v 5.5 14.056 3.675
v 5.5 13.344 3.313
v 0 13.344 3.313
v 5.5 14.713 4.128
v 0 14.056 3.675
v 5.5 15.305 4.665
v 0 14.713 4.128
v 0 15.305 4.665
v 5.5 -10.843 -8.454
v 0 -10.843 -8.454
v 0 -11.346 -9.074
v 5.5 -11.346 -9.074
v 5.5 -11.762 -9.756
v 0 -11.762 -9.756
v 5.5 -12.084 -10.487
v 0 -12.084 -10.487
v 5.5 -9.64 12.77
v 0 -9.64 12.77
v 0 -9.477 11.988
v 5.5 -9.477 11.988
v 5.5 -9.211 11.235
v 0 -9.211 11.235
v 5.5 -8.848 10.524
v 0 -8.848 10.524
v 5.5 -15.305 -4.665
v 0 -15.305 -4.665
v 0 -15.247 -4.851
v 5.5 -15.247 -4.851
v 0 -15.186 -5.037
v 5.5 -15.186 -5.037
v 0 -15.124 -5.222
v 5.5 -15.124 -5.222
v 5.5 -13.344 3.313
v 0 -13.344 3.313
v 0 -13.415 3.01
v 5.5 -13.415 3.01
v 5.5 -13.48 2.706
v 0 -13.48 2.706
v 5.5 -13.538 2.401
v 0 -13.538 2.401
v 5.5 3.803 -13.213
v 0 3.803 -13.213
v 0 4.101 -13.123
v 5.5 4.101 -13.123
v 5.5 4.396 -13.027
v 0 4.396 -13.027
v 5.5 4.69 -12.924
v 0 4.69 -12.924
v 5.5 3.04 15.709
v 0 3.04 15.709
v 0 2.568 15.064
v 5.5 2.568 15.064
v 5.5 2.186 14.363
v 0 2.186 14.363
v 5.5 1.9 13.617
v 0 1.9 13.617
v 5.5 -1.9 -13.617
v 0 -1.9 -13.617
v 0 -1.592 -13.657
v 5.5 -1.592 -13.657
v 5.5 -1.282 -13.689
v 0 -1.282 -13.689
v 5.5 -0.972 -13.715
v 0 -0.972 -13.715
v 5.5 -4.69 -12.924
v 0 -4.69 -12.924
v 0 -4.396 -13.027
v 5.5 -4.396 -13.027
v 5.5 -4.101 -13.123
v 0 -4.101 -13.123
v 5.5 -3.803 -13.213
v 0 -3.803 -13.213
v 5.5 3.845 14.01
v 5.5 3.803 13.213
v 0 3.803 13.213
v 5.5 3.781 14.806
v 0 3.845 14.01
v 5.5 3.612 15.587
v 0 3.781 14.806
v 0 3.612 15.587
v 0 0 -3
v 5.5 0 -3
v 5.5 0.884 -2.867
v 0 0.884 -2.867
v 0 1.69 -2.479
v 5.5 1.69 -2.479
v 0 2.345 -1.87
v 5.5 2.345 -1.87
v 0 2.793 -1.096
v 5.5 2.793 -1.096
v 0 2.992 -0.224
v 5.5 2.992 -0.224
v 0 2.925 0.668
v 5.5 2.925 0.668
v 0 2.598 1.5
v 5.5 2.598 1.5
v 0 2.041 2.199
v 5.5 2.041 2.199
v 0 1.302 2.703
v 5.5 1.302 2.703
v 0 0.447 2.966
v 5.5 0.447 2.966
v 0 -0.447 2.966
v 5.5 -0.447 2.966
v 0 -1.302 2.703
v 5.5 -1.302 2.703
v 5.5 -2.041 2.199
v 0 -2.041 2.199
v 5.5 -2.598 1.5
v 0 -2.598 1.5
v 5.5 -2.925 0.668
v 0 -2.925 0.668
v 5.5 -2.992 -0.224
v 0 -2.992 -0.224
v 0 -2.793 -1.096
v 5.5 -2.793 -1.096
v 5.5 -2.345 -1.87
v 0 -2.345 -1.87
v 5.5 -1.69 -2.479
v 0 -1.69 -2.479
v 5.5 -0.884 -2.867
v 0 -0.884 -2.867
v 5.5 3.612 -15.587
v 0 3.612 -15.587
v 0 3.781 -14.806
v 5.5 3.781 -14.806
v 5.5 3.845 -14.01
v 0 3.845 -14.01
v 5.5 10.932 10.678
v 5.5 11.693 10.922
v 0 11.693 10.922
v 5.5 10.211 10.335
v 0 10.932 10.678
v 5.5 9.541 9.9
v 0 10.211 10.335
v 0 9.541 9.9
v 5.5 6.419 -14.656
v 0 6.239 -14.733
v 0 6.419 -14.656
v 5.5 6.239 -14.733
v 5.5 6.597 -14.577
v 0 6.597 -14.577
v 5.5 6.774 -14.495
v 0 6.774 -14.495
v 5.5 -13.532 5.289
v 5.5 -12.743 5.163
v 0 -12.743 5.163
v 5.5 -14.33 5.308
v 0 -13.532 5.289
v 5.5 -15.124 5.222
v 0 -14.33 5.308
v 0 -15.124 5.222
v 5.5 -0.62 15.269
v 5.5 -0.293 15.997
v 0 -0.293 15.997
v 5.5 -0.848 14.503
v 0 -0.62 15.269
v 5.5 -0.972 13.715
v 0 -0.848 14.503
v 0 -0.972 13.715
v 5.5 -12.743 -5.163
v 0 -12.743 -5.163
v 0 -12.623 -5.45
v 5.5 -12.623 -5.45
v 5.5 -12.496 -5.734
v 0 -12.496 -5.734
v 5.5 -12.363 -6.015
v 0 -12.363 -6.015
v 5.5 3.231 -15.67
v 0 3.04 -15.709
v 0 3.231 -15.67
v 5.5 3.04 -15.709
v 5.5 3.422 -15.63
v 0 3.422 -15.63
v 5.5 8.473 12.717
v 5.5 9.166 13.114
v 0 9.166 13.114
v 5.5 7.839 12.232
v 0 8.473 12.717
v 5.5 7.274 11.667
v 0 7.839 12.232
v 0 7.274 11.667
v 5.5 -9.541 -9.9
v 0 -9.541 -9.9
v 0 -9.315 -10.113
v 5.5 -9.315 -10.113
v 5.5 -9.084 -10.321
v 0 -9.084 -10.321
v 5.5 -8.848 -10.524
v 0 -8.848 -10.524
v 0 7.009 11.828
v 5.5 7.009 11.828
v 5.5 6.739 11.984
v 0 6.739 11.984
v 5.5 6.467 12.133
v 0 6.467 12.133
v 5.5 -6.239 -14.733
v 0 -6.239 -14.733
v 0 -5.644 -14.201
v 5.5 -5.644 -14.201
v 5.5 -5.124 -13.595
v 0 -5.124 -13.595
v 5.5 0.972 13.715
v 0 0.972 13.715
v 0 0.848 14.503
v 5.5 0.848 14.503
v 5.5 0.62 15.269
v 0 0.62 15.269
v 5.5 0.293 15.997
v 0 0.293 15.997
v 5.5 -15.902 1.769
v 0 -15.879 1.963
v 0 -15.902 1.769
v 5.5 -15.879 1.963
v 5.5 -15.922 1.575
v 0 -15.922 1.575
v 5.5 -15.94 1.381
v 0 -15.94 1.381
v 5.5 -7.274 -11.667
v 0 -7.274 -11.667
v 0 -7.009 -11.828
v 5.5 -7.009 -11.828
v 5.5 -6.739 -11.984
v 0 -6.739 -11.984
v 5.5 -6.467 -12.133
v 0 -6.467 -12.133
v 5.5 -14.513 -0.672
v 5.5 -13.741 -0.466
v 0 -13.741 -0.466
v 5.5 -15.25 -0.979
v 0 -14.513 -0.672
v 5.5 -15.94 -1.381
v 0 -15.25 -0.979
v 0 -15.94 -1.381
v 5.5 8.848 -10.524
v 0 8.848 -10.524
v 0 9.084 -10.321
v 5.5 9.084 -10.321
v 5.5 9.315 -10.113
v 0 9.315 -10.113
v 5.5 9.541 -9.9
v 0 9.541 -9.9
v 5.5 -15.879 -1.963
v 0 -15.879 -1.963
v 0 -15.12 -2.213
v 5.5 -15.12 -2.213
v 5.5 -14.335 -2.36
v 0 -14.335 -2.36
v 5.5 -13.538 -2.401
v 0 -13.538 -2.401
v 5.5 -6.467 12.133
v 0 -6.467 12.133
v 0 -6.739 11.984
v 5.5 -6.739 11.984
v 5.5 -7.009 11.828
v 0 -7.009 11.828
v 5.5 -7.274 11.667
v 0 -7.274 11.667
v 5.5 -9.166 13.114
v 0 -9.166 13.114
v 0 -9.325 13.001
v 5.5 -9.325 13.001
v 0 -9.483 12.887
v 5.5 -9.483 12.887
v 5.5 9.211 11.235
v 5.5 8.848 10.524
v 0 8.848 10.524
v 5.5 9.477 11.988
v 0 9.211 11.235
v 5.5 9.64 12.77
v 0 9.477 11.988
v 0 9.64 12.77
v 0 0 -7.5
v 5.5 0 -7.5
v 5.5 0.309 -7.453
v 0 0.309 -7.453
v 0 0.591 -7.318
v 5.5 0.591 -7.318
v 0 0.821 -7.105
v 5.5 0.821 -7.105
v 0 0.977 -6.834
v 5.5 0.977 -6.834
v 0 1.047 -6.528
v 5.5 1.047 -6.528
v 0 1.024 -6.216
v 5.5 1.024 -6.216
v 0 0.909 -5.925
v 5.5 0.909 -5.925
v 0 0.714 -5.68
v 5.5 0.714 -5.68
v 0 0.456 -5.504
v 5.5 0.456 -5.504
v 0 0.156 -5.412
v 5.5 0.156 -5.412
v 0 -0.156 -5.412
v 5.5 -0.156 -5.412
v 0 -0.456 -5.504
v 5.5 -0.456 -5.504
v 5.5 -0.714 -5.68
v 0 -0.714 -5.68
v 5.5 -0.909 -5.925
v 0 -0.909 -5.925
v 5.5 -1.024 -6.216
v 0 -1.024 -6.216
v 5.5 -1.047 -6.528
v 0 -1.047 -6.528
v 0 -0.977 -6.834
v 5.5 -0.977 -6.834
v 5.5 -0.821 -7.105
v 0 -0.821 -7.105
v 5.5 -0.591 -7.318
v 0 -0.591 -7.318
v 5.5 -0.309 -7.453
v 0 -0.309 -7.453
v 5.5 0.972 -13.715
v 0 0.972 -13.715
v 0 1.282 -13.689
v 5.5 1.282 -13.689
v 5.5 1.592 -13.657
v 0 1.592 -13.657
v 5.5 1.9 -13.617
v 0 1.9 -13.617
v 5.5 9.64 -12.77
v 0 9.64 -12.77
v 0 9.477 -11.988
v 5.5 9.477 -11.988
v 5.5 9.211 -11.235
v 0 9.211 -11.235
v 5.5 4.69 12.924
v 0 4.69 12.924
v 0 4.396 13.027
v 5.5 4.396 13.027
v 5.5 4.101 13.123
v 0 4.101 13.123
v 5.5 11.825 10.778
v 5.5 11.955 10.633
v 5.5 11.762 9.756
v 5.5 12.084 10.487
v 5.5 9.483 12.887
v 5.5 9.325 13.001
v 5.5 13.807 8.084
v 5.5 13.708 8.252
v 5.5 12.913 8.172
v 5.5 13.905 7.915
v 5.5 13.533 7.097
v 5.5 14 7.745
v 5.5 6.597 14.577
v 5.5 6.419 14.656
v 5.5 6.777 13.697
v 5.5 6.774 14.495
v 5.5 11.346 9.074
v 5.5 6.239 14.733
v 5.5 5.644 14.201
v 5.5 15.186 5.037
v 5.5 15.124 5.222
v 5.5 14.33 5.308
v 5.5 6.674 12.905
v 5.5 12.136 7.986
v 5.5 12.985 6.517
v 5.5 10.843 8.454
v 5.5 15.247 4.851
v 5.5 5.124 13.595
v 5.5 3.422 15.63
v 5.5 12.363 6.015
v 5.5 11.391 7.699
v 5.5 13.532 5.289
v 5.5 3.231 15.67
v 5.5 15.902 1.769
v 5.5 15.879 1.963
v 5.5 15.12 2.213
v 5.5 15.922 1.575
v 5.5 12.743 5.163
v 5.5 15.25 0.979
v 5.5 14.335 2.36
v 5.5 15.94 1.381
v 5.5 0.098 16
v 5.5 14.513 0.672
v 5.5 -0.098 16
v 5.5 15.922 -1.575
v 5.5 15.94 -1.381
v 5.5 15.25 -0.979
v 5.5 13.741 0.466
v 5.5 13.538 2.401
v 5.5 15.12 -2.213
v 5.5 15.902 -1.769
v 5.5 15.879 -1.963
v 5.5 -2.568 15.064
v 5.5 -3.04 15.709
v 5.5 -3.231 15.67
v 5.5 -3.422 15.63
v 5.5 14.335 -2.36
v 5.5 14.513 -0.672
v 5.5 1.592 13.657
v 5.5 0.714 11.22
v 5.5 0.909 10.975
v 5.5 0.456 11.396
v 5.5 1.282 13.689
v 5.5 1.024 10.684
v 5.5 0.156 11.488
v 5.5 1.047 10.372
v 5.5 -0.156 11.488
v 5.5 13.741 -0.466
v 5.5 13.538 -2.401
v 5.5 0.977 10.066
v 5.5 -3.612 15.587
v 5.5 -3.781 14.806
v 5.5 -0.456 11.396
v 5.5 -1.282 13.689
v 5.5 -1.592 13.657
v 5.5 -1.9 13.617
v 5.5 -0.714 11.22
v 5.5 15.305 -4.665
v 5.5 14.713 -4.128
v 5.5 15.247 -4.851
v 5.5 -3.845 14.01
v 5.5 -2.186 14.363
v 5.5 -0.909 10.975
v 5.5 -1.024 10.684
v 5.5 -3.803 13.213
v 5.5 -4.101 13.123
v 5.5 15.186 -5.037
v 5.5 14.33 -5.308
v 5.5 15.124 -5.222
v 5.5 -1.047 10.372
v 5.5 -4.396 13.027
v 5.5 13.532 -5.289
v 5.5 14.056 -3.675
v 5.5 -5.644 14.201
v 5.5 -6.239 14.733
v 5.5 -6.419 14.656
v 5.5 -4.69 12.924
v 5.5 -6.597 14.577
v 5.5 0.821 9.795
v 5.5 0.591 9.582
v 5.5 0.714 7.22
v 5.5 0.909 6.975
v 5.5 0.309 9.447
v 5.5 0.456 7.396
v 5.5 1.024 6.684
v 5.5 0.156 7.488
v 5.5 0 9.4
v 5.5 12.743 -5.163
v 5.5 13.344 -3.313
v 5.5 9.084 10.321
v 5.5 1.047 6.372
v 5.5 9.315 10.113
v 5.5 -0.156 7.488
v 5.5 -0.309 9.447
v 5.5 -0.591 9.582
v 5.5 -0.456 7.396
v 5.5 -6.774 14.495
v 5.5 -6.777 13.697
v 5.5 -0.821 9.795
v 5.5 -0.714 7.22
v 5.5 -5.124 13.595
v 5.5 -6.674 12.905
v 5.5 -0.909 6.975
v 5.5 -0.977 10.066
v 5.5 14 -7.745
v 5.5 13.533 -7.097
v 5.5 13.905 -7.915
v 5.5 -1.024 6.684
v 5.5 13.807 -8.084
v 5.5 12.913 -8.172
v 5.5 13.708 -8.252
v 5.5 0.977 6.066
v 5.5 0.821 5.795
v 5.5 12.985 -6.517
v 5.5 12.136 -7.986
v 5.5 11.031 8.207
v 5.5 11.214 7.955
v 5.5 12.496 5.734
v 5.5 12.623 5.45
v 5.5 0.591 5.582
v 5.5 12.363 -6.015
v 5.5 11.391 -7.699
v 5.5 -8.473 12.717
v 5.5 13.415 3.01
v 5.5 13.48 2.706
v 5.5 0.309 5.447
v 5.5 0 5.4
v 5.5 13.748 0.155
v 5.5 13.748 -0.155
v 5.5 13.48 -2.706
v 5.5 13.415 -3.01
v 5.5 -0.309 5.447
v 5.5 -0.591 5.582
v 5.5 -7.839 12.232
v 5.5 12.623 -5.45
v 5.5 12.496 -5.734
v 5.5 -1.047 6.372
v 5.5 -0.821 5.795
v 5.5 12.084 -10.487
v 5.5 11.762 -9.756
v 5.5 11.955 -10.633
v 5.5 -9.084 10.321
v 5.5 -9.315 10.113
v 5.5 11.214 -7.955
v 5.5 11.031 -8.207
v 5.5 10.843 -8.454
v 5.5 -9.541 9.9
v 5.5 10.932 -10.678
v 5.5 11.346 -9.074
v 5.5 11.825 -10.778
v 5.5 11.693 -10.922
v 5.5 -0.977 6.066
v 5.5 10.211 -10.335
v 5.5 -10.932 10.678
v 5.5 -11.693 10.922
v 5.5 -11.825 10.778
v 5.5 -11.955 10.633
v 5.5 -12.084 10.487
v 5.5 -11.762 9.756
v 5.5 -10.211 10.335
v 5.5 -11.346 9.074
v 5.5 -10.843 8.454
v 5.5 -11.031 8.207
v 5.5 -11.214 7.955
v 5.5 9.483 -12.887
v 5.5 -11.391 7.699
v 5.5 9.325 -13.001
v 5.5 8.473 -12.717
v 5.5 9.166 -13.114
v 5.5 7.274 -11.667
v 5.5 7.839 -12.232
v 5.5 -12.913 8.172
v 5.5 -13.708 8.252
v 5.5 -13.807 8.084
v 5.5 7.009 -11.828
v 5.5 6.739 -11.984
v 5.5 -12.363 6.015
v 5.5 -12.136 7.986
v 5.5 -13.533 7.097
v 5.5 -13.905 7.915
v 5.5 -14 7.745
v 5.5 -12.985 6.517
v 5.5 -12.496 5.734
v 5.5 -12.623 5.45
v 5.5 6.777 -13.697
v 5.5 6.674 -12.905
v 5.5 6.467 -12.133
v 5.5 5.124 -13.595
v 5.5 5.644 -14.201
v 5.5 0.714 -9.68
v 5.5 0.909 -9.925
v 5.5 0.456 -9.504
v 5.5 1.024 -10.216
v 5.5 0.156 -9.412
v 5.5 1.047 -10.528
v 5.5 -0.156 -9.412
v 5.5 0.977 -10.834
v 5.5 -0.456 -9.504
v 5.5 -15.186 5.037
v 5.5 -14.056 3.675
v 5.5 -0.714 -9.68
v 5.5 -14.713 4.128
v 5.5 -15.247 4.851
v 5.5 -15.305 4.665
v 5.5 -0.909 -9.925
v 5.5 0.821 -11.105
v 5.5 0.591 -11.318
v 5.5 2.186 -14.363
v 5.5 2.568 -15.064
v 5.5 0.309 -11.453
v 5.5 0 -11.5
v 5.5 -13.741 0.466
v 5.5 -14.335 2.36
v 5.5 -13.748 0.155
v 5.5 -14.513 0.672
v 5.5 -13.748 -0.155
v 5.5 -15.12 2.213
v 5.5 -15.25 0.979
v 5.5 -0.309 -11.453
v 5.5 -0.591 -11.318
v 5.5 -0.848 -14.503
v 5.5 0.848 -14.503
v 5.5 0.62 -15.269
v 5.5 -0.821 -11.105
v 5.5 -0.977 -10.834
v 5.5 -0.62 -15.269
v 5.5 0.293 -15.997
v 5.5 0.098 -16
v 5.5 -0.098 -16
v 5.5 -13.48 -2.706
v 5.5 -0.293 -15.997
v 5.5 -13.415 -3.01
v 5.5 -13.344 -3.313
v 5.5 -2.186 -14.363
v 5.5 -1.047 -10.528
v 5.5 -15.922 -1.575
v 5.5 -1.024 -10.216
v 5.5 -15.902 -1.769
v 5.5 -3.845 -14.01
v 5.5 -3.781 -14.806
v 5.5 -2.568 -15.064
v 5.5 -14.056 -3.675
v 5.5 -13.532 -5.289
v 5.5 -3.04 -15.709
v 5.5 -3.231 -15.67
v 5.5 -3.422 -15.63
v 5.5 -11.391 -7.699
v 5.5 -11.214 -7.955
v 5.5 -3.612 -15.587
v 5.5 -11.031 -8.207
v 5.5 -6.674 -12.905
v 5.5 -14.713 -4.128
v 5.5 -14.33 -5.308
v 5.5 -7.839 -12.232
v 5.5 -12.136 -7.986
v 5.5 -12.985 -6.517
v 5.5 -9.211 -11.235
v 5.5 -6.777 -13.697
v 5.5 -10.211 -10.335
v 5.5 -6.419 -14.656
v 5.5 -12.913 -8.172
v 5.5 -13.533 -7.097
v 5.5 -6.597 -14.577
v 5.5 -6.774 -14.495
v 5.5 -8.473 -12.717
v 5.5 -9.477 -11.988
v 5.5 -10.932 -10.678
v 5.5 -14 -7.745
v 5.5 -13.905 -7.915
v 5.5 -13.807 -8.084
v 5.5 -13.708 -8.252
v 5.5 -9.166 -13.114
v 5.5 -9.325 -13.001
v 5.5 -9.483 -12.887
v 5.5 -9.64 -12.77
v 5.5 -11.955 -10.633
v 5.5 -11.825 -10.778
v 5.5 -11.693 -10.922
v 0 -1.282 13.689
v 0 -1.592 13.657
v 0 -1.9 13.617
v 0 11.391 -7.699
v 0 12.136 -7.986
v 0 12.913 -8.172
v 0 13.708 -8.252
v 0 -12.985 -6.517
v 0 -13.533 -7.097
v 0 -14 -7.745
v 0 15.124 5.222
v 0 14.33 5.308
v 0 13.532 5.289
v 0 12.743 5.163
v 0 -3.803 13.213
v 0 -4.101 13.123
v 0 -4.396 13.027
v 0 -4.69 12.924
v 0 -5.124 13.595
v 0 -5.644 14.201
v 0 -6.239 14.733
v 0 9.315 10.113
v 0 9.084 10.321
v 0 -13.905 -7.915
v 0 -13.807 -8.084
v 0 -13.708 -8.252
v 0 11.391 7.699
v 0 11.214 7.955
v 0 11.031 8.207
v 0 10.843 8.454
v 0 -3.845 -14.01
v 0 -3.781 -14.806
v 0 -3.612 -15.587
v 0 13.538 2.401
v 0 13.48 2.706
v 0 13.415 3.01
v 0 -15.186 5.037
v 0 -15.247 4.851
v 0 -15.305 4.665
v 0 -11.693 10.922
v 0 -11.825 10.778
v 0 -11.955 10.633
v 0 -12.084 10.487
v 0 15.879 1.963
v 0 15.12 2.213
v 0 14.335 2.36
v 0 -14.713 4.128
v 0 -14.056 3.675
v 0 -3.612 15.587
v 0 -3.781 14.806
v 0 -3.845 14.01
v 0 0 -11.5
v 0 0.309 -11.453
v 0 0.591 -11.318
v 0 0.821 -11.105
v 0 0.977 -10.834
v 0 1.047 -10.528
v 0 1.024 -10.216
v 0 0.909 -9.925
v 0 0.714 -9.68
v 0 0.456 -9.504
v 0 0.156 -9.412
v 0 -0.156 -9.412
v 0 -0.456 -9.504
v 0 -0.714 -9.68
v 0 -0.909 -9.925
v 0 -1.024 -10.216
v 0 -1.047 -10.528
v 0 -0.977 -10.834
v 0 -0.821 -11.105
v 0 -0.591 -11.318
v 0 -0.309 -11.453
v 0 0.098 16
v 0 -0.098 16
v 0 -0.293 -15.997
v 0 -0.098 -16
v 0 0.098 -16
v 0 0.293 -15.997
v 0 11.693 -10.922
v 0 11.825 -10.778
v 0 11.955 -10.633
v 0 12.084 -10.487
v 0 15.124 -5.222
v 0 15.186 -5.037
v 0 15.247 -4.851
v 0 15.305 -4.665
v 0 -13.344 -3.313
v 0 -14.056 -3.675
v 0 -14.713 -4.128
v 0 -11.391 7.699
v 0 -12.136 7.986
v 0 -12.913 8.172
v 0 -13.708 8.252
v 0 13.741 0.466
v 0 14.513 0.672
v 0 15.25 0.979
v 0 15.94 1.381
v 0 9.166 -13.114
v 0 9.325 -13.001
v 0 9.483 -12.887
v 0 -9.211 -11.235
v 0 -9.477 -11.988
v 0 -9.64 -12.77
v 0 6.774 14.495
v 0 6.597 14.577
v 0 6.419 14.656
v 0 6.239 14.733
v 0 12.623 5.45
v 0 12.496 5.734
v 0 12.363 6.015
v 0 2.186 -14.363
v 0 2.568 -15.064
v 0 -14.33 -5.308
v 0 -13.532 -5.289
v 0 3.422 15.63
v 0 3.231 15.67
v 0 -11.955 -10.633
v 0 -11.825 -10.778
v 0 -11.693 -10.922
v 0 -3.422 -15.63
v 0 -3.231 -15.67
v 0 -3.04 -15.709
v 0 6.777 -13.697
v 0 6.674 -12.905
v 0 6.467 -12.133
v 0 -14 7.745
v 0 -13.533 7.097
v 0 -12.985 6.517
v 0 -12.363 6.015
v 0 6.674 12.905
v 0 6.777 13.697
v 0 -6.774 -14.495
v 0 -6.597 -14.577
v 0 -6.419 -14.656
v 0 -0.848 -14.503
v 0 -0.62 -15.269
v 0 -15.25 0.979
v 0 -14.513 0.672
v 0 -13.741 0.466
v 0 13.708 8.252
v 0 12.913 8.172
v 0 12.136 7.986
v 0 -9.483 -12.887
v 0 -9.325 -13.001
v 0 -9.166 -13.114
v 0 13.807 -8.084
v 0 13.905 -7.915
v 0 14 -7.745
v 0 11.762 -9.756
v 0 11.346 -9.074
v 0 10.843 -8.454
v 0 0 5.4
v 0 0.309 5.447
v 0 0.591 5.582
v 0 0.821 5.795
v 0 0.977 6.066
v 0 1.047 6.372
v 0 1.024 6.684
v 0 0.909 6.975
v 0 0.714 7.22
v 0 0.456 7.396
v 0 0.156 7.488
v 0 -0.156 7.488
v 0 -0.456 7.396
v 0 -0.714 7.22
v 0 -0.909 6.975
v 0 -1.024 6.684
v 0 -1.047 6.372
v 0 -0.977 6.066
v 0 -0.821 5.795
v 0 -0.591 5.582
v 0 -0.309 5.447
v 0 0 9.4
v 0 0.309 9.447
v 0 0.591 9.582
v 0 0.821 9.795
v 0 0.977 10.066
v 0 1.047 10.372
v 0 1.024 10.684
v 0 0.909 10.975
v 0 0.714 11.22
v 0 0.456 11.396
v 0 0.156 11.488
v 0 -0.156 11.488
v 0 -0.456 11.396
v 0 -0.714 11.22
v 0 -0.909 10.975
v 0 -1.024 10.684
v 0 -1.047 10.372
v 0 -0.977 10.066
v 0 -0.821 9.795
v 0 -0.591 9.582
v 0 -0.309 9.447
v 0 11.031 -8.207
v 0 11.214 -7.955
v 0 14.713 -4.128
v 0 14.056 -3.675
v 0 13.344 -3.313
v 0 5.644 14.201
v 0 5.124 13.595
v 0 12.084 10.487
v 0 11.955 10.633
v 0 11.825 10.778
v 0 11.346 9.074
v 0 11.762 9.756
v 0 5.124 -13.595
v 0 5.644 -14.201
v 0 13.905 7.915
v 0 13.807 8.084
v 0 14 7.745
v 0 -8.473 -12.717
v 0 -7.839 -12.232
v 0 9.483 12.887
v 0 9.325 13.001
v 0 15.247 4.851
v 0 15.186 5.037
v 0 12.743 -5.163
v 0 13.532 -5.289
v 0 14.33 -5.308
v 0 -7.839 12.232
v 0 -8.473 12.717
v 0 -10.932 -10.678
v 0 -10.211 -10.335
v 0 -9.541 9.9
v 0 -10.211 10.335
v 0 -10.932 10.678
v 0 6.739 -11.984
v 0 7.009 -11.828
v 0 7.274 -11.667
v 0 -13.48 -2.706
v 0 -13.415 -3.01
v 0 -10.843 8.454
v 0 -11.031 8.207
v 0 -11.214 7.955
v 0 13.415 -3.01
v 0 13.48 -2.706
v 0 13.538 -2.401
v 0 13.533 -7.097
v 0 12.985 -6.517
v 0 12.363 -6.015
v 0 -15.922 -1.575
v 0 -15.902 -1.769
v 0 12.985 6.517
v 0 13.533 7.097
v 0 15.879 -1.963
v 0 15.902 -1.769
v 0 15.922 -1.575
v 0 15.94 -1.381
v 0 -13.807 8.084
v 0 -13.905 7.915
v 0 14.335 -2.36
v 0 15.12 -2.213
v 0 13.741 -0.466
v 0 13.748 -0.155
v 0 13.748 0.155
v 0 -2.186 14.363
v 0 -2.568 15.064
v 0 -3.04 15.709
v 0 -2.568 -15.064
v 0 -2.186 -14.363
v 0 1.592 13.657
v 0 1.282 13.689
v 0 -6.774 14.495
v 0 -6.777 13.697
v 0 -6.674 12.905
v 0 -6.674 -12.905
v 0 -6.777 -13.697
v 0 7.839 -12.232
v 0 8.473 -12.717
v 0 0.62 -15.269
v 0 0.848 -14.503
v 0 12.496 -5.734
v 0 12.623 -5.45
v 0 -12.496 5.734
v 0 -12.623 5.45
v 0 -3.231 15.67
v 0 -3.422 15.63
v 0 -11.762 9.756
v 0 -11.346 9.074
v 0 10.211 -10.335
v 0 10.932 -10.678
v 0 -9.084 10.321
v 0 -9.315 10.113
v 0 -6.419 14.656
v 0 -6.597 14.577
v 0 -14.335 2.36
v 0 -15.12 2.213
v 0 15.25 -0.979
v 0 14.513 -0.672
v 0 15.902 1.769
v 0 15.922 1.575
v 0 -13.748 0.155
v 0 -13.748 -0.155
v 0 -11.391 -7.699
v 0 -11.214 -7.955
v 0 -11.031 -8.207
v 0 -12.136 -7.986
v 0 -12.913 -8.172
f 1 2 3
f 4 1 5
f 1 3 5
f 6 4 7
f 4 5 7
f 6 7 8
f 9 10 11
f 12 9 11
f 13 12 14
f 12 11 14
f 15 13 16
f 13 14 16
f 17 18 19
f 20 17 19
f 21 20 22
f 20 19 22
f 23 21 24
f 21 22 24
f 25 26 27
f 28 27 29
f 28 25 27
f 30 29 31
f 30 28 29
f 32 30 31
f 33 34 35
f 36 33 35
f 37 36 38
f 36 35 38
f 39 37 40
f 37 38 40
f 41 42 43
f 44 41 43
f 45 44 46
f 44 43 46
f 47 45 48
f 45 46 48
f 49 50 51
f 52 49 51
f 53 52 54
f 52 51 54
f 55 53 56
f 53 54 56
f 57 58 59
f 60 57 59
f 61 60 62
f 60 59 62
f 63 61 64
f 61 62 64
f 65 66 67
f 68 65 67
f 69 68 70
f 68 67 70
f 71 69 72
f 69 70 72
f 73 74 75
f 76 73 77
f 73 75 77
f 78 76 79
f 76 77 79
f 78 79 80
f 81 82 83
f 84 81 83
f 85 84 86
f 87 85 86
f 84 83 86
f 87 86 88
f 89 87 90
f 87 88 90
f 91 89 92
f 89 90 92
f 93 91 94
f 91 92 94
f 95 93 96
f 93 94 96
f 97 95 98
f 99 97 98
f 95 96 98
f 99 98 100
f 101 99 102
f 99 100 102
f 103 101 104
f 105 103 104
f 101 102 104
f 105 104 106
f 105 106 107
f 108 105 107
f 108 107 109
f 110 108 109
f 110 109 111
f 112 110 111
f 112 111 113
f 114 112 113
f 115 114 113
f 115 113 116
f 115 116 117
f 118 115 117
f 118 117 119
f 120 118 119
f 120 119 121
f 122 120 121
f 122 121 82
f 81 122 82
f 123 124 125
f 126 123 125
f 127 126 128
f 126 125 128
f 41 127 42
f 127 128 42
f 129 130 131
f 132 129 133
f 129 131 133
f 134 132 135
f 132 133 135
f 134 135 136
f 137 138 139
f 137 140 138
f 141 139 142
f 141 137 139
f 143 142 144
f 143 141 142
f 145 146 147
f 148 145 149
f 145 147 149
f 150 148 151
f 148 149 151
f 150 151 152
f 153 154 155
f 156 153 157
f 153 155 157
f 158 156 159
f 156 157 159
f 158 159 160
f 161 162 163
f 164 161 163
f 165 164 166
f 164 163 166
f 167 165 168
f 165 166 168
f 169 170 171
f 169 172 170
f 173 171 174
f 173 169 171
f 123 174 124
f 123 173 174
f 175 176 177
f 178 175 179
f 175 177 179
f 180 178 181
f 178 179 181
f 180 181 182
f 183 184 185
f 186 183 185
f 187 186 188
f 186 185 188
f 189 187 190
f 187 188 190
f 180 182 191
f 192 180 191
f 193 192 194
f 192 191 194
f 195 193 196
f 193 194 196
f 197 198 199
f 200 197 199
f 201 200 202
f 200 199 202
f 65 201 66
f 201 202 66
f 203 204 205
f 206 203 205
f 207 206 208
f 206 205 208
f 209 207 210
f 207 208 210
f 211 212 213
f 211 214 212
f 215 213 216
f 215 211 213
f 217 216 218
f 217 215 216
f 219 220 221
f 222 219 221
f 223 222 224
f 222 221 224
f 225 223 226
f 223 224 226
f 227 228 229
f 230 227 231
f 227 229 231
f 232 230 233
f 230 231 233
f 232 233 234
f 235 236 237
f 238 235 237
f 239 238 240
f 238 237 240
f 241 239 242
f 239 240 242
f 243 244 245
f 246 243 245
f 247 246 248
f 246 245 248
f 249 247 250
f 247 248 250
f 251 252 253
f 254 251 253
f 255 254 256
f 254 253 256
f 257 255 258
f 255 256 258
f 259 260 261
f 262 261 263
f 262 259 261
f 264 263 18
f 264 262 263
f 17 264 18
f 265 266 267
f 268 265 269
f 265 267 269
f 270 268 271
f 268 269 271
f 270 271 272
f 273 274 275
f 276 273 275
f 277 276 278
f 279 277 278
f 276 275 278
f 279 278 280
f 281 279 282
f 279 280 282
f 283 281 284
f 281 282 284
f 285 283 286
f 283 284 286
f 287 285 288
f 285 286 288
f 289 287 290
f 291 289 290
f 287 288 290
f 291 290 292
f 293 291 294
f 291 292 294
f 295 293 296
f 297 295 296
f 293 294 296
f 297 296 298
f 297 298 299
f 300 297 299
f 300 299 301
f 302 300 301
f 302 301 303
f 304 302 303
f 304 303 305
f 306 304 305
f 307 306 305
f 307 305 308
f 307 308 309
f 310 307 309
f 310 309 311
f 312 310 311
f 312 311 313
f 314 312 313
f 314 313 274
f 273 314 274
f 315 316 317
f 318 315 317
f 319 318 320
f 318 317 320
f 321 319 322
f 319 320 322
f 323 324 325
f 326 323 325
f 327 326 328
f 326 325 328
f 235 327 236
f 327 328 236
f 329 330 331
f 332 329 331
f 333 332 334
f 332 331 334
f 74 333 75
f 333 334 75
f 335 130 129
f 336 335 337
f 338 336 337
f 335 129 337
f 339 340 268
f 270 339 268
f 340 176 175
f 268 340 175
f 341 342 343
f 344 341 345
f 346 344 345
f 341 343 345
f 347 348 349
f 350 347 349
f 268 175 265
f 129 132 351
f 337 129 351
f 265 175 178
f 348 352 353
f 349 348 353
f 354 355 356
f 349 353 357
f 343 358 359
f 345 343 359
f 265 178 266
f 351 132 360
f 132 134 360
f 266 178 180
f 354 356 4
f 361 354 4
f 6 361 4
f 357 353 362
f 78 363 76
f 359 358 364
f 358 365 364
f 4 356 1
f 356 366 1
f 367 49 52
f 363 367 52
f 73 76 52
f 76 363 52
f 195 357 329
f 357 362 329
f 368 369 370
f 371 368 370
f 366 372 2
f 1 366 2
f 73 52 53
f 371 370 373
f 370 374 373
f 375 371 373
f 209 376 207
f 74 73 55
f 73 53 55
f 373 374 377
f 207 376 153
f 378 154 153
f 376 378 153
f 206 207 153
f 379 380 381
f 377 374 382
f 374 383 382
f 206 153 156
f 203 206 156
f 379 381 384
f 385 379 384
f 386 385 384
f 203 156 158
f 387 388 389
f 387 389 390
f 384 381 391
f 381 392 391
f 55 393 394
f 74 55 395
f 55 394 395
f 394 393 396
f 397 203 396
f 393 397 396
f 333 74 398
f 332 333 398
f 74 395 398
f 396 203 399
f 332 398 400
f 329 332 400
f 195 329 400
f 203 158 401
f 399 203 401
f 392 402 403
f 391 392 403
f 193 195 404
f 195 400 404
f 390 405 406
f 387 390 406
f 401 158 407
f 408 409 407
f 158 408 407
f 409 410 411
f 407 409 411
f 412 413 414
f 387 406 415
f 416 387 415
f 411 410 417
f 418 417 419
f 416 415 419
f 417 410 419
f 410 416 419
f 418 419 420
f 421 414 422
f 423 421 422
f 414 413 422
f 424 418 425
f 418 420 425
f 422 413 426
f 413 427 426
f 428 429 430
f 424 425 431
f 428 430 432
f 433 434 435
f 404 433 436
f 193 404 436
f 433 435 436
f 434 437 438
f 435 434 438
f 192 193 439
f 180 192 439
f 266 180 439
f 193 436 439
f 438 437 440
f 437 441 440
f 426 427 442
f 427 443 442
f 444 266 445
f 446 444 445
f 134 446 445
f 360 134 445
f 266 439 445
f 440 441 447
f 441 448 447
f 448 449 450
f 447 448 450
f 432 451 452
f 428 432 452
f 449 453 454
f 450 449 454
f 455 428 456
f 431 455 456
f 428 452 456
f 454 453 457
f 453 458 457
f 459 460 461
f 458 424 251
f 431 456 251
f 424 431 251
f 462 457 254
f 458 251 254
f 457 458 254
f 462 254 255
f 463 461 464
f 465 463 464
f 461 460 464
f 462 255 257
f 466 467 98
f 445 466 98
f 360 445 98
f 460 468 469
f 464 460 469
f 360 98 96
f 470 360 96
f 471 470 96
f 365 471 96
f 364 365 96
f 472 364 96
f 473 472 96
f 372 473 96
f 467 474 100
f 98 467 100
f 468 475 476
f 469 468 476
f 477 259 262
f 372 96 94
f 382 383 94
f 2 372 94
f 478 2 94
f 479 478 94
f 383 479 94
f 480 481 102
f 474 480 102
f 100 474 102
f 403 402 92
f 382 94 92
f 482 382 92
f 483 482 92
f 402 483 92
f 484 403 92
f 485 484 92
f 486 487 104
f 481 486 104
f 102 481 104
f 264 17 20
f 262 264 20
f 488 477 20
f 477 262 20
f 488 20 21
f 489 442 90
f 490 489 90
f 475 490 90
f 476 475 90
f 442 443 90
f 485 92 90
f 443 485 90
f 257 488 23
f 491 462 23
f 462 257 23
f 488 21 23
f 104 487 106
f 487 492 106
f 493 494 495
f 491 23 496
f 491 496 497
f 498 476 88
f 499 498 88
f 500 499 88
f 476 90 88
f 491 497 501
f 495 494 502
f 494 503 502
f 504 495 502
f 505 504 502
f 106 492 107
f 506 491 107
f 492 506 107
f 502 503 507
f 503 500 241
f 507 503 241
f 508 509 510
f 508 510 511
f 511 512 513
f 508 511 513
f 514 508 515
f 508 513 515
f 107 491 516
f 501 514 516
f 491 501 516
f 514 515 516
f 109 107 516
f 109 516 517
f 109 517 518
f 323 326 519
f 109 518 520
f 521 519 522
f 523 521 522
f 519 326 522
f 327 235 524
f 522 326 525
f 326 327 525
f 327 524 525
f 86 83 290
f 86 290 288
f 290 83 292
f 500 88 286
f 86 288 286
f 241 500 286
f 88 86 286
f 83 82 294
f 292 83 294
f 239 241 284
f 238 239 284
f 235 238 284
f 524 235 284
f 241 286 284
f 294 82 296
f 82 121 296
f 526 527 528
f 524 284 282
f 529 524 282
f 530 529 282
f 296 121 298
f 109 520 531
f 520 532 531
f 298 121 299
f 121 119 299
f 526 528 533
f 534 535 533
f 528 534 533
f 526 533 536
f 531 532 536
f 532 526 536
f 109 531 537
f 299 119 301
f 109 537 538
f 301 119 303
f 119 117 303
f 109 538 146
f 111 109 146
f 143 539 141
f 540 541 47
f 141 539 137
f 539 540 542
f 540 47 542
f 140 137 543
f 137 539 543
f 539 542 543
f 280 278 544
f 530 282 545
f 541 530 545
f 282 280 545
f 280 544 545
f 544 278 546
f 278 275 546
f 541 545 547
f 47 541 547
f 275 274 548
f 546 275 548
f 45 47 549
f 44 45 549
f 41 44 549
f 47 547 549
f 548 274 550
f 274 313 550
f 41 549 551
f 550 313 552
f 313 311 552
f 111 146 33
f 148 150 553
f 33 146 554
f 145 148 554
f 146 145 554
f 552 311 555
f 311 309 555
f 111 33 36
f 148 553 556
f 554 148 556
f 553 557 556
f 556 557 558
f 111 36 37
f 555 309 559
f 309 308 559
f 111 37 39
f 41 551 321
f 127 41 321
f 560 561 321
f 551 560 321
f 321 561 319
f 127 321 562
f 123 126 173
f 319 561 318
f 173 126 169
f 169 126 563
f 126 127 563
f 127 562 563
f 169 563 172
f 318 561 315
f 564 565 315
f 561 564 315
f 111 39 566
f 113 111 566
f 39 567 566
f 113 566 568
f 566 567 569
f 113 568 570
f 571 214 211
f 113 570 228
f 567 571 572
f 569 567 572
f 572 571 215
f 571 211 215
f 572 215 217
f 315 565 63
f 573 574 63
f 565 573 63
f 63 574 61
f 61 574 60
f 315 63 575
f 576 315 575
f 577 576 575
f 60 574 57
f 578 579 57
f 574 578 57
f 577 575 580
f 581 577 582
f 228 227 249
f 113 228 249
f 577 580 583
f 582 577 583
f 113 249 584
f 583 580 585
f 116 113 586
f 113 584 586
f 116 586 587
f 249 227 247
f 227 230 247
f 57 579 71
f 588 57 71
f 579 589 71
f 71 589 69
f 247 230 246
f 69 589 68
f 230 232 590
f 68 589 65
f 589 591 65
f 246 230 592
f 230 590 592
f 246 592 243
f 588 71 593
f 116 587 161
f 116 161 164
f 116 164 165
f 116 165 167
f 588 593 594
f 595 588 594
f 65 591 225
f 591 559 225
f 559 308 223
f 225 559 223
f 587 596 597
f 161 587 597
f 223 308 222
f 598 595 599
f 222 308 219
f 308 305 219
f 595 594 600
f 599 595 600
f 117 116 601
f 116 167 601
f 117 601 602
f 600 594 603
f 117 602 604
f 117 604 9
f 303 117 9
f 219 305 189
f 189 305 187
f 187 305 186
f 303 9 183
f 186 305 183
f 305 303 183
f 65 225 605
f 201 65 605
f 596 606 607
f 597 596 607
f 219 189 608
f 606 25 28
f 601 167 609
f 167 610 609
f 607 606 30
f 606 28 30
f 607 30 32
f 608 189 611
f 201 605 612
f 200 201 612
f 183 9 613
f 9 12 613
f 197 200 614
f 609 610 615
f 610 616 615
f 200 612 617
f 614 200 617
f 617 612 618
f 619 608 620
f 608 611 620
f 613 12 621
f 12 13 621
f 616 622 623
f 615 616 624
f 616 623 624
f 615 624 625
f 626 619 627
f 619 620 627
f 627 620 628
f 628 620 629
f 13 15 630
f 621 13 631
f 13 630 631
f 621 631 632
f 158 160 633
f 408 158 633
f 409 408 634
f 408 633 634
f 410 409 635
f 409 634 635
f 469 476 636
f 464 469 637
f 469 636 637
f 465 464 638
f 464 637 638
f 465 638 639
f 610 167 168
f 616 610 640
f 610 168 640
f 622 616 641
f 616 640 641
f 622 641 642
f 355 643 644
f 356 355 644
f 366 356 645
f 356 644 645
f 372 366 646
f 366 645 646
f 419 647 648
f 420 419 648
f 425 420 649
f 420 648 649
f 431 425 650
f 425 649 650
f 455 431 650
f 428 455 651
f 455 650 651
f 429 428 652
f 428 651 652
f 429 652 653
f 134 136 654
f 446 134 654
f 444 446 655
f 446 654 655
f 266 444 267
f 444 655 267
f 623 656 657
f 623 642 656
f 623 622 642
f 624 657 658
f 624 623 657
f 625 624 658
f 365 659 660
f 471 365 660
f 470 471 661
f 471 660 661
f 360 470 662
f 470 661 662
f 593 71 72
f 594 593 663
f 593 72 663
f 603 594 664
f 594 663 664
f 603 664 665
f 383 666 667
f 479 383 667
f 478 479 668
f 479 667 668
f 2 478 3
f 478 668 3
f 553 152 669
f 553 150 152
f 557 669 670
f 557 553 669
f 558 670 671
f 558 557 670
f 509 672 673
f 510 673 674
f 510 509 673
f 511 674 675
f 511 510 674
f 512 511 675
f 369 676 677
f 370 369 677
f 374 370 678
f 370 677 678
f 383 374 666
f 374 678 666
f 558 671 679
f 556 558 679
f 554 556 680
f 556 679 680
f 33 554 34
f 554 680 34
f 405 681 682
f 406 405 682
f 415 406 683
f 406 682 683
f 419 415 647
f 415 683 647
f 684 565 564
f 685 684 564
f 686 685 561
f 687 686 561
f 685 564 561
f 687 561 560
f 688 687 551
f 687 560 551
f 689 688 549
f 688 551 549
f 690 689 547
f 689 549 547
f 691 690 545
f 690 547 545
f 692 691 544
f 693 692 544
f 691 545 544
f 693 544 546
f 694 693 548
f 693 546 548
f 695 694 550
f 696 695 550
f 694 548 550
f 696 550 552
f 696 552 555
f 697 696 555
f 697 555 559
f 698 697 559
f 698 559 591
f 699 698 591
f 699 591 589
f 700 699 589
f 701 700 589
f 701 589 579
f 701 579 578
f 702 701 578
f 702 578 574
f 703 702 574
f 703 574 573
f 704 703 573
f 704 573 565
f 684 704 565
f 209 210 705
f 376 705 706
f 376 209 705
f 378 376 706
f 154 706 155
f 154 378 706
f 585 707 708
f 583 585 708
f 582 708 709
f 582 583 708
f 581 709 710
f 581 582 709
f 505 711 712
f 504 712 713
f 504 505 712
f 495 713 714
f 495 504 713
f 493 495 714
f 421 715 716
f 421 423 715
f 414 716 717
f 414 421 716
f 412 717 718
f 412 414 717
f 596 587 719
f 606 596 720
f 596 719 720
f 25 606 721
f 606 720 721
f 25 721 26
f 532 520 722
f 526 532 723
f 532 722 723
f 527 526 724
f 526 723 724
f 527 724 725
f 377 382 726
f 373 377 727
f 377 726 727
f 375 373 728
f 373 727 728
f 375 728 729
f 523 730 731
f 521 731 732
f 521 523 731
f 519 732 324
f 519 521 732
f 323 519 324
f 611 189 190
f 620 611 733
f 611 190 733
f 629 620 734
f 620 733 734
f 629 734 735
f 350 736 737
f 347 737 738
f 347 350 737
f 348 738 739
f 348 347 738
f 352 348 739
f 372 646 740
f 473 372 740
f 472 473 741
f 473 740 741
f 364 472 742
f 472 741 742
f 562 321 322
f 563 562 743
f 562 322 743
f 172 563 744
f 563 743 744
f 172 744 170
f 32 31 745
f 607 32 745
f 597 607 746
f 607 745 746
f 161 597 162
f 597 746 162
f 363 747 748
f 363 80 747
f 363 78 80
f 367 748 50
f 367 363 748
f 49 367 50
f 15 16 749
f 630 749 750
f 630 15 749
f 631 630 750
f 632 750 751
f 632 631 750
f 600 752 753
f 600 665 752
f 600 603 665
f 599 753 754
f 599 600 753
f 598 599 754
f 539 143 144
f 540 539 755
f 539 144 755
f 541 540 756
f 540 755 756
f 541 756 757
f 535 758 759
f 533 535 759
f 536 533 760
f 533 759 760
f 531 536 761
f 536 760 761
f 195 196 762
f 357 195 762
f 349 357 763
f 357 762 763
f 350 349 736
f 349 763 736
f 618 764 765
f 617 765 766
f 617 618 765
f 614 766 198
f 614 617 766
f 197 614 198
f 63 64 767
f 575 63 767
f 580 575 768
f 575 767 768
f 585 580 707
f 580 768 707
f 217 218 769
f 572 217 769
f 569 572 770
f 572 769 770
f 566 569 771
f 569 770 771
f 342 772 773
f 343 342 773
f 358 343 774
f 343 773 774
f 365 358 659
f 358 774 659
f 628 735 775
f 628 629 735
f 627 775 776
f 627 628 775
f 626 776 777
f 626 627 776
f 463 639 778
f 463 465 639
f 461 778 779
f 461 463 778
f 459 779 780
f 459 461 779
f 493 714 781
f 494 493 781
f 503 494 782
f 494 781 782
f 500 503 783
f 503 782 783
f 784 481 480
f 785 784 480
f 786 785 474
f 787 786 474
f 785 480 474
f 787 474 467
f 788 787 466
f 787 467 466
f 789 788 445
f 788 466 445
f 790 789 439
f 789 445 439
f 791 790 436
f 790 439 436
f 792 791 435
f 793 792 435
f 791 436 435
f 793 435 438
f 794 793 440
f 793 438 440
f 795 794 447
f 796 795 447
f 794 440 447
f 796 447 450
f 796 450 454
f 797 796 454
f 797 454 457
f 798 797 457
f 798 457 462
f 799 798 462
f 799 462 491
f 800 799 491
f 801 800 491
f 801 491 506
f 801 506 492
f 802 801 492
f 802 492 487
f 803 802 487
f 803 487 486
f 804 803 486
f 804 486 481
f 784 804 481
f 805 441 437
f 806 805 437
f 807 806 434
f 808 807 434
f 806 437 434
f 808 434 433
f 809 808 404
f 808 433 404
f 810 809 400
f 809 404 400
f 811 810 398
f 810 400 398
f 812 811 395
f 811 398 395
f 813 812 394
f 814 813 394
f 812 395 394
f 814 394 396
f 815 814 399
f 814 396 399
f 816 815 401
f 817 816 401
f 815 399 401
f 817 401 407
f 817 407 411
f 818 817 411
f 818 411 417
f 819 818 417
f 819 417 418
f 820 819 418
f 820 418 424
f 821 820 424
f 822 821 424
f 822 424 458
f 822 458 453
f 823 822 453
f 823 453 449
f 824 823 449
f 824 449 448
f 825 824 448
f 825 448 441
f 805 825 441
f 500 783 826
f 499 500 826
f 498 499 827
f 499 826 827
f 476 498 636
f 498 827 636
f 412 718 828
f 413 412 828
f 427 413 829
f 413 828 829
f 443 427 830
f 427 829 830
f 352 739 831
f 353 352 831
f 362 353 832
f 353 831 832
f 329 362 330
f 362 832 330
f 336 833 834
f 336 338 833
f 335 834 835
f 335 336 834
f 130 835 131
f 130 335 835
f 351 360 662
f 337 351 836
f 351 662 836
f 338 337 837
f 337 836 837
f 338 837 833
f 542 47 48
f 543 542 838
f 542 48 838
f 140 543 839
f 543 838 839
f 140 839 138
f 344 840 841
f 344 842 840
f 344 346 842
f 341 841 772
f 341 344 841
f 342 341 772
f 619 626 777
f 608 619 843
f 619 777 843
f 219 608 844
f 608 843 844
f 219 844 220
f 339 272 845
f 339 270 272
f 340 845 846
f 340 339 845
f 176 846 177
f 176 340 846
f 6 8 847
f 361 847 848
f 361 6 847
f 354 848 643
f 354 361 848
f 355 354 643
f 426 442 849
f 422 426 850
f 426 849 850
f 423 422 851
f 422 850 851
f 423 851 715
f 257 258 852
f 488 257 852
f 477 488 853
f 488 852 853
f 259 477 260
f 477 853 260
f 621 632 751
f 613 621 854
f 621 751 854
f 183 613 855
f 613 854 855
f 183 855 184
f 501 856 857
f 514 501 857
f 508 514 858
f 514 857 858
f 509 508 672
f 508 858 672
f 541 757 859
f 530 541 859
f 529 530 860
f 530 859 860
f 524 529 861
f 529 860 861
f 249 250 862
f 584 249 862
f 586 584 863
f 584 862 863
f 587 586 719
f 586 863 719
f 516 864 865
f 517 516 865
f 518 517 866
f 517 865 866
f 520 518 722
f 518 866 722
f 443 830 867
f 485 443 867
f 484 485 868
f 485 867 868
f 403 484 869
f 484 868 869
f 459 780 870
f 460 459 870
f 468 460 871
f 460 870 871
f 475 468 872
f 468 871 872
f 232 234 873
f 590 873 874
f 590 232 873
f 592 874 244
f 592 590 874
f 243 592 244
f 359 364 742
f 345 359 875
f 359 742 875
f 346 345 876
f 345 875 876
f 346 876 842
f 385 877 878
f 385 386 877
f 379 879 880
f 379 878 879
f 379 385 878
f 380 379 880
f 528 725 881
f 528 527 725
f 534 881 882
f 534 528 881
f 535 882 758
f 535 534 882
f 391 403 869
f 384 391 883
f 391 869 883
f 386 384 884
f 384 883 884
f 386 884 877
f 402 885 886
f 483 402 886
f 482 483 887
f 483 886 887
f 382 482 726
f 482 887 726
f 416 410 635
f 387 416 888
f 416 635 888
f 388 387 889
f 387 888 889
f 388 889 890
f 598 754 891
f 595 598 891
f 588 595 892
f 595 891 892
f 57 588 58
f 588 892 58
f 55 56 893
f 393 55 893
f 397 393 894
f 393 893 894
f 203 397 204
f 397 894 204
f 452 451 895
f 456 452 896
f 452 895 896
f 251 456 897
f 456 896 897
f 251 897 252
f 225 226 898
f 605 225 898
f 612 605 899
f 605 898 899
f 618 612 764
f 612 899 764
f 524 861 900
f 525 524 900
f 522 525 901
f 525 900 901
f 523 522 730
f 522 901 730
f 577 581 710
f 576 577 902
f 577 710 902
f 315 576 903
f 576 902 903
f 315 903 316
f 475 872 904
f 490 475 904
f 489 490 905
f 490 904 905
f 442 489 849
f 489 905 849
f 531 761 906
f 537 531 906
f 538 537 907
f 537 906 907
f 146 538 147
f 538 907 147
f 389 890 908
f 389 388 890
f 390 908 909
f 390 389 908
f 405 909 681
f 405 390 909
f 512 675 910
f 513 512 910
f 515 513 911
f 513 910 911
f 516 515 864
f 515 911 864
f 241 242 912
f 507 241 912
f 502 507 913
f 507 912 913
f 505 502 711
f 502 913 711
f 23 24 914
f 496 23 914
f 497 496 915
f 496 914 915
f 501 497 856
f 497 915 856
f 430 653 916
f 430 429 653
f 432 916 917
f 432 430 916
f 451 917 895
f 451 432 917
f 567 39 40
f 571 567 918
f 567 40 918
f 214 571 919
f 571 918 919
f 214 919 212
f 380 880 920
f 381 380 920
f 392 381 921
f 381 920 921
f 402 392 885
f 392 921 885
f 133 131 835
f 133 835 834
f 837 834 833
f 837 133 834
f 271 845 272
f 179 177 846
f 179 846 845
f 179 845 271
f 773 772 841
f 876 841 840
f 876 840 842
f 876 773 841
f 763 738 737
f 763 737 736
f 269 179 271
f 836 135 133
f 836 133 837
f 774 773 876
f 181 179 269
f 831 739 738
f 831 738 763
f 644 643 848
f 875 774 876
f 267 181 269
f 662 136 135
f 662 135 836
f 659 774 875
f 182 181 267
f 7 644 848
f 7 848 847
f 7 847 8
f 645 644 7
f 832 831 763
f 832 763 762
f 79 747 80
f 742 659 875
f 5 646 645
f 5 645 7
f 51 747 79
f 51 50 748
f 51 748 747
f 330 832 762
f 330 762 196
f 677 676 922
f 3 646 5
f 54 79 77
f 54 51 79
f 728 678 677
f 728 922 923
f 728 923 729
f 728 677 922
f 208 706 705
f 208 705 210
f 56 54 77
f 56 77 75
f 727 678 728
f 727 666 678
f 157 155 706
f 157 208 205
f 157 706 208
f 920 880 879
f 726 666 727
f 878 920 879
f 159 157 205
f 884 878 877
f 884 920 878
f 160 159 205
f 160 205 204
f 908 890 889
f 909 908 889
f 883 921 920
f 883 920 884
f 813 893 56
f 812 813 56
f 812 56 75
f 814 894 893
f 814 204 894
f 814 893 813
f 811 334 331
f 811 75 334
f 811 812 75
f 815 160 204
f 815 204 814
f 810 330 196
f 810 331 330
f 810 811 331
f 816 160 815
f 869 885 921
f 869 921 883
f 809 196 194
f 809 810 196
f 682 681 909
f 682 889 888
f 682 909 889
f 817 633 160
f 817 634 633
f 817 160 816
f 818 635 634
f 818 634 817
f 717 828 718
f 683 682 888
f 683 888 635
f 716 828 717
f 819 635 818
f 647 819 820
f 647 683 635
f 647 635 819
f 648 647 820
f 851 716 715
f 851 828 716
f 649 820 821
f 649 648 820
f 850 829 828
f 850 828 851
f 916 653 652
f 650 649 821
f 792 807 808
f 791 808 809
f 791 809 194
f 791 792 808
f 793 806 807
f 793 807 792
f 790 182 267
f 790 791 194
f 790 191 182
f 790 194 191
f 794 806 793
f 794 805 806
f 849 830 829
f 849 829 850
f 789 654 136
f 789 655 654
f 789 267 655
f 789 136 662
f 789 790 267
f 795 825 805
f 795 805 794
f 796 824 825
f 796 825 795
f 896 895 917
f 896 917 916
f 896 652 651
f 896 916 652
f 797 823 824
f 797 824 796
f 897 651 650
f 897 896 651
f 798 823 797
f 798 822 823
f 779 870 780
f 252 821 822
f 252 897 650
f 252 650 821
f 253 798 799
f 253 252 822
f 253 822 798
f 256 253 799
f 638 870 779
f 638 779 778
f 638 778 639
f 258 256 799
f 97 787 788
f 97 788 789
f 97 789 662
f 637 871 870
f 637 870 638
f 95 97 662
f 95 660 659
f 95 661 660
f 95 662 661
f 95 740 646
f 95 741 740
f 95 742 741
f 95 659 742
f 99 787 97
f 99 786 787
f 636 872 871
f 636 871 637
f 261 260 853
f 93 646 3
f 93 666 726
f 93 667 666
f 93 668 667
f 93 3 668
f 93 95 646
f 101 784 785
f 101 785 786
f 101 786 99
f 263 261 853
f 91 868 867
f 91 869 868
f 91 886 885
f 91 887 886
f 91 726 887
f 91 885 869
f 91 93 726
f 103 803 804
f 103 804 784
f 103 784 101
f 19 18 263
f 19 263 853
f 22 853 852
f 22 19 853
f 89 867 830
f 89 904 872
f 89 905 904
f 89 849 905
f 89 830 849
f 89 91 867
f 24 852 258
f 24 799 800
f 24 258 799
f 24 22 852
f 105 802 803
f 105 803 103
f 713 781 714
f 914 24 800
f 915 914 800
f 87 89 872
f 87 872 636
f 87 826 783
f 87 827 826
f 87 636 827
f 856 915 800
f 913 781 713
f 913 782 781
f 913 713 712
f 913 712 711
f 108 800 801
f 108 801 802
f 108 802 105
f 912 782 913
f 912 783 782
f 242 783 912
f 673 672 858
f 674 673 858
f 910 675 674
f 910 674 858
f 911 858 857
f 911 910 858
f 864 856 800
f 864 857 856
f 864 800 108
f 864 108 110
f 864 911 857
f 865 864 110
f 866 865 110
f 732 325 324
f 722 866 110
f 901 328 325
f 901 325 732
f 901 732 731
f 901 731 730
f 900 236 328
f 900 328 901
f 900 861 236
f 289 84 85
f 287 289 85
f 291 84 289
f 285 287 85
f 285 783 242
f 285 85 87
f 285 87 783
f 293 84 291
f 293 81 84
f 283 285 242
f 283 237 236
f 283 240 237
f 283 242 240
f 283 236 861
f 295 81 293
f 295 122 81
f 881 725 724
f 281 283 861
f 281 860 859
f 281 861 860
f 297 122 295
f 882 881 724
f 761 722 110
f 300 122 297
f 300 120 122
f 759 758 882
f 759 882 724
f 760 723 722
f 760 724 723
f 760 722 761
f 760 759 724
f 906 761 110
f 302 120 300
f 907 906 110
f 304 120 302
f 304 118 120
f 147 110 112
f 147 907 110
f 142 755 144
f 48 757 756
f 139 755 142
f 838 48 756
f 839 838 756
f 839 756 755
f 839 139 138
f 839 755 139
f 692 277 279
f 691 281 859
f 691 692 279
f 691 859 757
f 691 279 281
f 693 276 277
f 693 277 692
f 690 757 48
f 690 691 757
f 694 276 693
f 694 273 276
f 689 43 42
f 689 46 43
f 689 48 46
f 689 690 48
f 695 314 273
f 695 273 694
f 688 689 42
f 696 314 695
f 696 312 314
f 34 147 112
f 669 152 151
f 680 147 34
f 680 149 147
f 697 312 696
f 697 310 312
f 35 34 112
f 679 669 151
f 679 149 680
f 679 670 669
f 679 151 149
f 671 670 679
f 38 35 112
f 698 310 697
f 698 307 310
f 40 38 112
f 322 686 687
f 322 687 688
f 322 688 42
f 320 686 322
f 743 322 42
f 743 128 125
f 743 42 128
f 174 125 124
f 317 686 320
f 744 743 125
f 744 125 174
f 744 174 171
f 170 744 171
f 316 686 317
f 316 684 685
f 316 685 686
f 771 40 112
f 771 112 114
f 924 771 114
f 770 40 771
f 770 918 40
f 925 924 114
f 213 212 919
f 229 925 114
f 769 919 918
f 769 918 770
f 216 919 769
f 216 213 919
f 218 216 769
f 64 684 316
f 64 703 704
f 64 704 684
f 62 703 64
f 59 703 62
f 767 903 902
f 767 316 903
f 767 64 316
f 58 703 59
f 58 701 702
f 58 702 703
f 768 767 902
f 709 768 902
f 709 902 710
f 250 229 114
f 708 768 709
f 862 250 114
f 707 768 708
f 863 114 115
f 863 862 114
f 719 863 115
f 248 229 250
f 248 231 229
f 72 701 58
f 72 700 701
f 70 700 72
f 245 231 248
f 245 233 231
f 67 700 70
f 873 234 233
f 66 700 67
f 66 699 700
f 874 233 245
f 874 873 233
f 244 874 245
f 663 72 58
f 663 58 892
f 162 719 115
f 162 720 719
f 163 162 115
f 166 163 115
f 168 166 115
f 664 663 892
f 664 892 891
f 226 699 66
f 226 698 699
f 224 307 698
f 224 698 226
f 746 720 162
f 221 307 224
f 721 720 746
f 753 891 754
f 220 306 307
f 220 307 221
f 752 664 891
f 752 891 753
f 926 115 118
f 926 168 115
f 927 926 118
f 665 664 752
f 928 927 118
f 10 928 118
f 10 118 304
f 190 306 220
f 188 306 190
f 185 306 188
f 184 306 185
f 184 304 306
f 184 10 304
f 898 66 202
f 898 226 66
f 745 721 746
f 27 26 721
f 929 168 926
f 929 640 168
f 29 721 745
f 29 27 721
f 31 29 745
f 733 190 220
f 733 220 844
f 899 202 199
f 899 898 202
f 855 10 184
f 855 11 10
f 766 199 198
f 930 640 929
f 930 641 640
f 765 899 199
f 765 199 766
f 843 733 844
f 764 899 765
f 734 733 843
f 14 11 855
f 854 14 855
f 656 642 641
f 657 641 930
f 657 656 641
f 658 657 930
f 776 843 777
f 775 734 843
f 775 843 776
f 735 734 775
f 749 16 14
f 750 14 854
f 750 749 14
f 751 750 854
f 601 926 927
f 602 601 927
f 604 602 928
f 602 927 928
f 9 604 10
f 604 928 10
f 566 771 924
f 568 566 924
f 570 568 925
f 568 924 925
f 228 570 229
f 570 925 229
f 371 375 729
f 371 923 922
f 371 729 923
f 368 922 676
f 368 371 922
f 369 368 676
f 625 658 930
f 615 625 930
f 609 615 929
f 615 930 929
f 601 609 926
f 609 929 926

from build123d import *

# Parameters (mm, degrees)
BASPROSKE_W         = 5.5
BASPROSKE_H         = 16
TOOTHCUT_DEPTH      = 24.286262044
TEETHCUTS_COUNT     = 30
TEETHCUTS_ANGLE     = 348
BORSKE_R            = 0.5
BORE_DEPTH          = 50.0000508
SKETCH_1_R          = 3
SKETCH_1_R_2        = 1.05
CUT_EXTRUDE_1_DEPTH = 24.245268194


with BuildPart() as part:
    # BasProSke → Base-Revolve (revolve)
    with BuildSketch(Plane(origin=(0, 0, 0), x_dir=(1, 0, 0), z_dir=(0, 1, 0)), mode=Mode.PRIVATE) as base_revolve_sk:
        with Locations((2.75, 8)):
            Rectangle(BASPROSKE_W, BASPROSKE_H)
    revolve(base_revolve_sk.sketch.rotate(Axis((-10, 0, 0), (1, 0, 0)), 180), axis=Axis((-10, 0, 0), (1, 0, 0)))

    # TooCutSke → ToothCut (cut, through all)
    with BuildSketch(Plane(origin=(0, 0, 0), x_dir=(0, 0, -1), z_dir=(1, 0, 0))):
        with BuildLine():
            ThreePointArc((0.466400716, 13.741086979), (0, 13.749), (-0.466400716, 13.741086979))
            ThreePointArc((-0.466400716, 13.741086979), (-0.819142092, 14.899954875), (-1.3974676, 15.964351834))
            ThreePointArc((-1.3974676, 15.964351834), (0, 16.0254), (1.3974676, 15.964351834))
            ThreePointArc((1.3974676, 15.964351834), (0.819142092, 14.899954875), (0.466400716, 13.741086979))
        make_face()
    toothcut = extrude(amount=TOOTHCUT_DEPTH, mode=Mode.SUBTRACT)

    # TeethCuts: ToothCut ×30 about axis
    teethcuts_axis = Axis((-10, 0, 0), (1, 0, 0))
    for i in range(1, TEETHCUTS_COUNT):
        add(toothcut.rotate(teethcuts_axis, i * TEETHCUTS_ANGLE / (TEETHCUTS_COUNT - 1)), mode=Mode.SUBTRACT)

    # BorSke → Bore (cut, symmetric)
    with BuildSketch(Plane(origin=(0, 0, 0), x_dir=(0, 0, -1), z_dir=(1, 0, 0))):
        with Locations(Location((0, 0, 0), (0, 0, 180))):
            Circle(BORSKE_R)
    extrude(amount=BORE_DEPTH, both=True, mode=Mode.SUBTRACT)

    # ｽｹｯﾁ1 → ｶｯﾄ - 押し出し1 (cut, through all)
    with BuildSketch(Plane(origin=(5.5, 0, 0), x_dir=(0, 0, -1), z_dir=(1, 0, 0))):
        Circle(SKETCH_1_R)
        with Locations((6.45, 0)):
            Circle(SKETCH_1_R_2)
        with Locations((10.45, 0)):
            Circle(SKETCH_1_R_2)
        with Locations((-6.45, 0)):
            Circle(SKETCH_1_R_2)
        with Locations((-10.45, 0)):
            Circle(SKETCH_1_R_2)
    extrude(amount=-CUT_EXTRUDE_1_DEPTH, mode=Mode.SUBTRACT)


solid = part.part
